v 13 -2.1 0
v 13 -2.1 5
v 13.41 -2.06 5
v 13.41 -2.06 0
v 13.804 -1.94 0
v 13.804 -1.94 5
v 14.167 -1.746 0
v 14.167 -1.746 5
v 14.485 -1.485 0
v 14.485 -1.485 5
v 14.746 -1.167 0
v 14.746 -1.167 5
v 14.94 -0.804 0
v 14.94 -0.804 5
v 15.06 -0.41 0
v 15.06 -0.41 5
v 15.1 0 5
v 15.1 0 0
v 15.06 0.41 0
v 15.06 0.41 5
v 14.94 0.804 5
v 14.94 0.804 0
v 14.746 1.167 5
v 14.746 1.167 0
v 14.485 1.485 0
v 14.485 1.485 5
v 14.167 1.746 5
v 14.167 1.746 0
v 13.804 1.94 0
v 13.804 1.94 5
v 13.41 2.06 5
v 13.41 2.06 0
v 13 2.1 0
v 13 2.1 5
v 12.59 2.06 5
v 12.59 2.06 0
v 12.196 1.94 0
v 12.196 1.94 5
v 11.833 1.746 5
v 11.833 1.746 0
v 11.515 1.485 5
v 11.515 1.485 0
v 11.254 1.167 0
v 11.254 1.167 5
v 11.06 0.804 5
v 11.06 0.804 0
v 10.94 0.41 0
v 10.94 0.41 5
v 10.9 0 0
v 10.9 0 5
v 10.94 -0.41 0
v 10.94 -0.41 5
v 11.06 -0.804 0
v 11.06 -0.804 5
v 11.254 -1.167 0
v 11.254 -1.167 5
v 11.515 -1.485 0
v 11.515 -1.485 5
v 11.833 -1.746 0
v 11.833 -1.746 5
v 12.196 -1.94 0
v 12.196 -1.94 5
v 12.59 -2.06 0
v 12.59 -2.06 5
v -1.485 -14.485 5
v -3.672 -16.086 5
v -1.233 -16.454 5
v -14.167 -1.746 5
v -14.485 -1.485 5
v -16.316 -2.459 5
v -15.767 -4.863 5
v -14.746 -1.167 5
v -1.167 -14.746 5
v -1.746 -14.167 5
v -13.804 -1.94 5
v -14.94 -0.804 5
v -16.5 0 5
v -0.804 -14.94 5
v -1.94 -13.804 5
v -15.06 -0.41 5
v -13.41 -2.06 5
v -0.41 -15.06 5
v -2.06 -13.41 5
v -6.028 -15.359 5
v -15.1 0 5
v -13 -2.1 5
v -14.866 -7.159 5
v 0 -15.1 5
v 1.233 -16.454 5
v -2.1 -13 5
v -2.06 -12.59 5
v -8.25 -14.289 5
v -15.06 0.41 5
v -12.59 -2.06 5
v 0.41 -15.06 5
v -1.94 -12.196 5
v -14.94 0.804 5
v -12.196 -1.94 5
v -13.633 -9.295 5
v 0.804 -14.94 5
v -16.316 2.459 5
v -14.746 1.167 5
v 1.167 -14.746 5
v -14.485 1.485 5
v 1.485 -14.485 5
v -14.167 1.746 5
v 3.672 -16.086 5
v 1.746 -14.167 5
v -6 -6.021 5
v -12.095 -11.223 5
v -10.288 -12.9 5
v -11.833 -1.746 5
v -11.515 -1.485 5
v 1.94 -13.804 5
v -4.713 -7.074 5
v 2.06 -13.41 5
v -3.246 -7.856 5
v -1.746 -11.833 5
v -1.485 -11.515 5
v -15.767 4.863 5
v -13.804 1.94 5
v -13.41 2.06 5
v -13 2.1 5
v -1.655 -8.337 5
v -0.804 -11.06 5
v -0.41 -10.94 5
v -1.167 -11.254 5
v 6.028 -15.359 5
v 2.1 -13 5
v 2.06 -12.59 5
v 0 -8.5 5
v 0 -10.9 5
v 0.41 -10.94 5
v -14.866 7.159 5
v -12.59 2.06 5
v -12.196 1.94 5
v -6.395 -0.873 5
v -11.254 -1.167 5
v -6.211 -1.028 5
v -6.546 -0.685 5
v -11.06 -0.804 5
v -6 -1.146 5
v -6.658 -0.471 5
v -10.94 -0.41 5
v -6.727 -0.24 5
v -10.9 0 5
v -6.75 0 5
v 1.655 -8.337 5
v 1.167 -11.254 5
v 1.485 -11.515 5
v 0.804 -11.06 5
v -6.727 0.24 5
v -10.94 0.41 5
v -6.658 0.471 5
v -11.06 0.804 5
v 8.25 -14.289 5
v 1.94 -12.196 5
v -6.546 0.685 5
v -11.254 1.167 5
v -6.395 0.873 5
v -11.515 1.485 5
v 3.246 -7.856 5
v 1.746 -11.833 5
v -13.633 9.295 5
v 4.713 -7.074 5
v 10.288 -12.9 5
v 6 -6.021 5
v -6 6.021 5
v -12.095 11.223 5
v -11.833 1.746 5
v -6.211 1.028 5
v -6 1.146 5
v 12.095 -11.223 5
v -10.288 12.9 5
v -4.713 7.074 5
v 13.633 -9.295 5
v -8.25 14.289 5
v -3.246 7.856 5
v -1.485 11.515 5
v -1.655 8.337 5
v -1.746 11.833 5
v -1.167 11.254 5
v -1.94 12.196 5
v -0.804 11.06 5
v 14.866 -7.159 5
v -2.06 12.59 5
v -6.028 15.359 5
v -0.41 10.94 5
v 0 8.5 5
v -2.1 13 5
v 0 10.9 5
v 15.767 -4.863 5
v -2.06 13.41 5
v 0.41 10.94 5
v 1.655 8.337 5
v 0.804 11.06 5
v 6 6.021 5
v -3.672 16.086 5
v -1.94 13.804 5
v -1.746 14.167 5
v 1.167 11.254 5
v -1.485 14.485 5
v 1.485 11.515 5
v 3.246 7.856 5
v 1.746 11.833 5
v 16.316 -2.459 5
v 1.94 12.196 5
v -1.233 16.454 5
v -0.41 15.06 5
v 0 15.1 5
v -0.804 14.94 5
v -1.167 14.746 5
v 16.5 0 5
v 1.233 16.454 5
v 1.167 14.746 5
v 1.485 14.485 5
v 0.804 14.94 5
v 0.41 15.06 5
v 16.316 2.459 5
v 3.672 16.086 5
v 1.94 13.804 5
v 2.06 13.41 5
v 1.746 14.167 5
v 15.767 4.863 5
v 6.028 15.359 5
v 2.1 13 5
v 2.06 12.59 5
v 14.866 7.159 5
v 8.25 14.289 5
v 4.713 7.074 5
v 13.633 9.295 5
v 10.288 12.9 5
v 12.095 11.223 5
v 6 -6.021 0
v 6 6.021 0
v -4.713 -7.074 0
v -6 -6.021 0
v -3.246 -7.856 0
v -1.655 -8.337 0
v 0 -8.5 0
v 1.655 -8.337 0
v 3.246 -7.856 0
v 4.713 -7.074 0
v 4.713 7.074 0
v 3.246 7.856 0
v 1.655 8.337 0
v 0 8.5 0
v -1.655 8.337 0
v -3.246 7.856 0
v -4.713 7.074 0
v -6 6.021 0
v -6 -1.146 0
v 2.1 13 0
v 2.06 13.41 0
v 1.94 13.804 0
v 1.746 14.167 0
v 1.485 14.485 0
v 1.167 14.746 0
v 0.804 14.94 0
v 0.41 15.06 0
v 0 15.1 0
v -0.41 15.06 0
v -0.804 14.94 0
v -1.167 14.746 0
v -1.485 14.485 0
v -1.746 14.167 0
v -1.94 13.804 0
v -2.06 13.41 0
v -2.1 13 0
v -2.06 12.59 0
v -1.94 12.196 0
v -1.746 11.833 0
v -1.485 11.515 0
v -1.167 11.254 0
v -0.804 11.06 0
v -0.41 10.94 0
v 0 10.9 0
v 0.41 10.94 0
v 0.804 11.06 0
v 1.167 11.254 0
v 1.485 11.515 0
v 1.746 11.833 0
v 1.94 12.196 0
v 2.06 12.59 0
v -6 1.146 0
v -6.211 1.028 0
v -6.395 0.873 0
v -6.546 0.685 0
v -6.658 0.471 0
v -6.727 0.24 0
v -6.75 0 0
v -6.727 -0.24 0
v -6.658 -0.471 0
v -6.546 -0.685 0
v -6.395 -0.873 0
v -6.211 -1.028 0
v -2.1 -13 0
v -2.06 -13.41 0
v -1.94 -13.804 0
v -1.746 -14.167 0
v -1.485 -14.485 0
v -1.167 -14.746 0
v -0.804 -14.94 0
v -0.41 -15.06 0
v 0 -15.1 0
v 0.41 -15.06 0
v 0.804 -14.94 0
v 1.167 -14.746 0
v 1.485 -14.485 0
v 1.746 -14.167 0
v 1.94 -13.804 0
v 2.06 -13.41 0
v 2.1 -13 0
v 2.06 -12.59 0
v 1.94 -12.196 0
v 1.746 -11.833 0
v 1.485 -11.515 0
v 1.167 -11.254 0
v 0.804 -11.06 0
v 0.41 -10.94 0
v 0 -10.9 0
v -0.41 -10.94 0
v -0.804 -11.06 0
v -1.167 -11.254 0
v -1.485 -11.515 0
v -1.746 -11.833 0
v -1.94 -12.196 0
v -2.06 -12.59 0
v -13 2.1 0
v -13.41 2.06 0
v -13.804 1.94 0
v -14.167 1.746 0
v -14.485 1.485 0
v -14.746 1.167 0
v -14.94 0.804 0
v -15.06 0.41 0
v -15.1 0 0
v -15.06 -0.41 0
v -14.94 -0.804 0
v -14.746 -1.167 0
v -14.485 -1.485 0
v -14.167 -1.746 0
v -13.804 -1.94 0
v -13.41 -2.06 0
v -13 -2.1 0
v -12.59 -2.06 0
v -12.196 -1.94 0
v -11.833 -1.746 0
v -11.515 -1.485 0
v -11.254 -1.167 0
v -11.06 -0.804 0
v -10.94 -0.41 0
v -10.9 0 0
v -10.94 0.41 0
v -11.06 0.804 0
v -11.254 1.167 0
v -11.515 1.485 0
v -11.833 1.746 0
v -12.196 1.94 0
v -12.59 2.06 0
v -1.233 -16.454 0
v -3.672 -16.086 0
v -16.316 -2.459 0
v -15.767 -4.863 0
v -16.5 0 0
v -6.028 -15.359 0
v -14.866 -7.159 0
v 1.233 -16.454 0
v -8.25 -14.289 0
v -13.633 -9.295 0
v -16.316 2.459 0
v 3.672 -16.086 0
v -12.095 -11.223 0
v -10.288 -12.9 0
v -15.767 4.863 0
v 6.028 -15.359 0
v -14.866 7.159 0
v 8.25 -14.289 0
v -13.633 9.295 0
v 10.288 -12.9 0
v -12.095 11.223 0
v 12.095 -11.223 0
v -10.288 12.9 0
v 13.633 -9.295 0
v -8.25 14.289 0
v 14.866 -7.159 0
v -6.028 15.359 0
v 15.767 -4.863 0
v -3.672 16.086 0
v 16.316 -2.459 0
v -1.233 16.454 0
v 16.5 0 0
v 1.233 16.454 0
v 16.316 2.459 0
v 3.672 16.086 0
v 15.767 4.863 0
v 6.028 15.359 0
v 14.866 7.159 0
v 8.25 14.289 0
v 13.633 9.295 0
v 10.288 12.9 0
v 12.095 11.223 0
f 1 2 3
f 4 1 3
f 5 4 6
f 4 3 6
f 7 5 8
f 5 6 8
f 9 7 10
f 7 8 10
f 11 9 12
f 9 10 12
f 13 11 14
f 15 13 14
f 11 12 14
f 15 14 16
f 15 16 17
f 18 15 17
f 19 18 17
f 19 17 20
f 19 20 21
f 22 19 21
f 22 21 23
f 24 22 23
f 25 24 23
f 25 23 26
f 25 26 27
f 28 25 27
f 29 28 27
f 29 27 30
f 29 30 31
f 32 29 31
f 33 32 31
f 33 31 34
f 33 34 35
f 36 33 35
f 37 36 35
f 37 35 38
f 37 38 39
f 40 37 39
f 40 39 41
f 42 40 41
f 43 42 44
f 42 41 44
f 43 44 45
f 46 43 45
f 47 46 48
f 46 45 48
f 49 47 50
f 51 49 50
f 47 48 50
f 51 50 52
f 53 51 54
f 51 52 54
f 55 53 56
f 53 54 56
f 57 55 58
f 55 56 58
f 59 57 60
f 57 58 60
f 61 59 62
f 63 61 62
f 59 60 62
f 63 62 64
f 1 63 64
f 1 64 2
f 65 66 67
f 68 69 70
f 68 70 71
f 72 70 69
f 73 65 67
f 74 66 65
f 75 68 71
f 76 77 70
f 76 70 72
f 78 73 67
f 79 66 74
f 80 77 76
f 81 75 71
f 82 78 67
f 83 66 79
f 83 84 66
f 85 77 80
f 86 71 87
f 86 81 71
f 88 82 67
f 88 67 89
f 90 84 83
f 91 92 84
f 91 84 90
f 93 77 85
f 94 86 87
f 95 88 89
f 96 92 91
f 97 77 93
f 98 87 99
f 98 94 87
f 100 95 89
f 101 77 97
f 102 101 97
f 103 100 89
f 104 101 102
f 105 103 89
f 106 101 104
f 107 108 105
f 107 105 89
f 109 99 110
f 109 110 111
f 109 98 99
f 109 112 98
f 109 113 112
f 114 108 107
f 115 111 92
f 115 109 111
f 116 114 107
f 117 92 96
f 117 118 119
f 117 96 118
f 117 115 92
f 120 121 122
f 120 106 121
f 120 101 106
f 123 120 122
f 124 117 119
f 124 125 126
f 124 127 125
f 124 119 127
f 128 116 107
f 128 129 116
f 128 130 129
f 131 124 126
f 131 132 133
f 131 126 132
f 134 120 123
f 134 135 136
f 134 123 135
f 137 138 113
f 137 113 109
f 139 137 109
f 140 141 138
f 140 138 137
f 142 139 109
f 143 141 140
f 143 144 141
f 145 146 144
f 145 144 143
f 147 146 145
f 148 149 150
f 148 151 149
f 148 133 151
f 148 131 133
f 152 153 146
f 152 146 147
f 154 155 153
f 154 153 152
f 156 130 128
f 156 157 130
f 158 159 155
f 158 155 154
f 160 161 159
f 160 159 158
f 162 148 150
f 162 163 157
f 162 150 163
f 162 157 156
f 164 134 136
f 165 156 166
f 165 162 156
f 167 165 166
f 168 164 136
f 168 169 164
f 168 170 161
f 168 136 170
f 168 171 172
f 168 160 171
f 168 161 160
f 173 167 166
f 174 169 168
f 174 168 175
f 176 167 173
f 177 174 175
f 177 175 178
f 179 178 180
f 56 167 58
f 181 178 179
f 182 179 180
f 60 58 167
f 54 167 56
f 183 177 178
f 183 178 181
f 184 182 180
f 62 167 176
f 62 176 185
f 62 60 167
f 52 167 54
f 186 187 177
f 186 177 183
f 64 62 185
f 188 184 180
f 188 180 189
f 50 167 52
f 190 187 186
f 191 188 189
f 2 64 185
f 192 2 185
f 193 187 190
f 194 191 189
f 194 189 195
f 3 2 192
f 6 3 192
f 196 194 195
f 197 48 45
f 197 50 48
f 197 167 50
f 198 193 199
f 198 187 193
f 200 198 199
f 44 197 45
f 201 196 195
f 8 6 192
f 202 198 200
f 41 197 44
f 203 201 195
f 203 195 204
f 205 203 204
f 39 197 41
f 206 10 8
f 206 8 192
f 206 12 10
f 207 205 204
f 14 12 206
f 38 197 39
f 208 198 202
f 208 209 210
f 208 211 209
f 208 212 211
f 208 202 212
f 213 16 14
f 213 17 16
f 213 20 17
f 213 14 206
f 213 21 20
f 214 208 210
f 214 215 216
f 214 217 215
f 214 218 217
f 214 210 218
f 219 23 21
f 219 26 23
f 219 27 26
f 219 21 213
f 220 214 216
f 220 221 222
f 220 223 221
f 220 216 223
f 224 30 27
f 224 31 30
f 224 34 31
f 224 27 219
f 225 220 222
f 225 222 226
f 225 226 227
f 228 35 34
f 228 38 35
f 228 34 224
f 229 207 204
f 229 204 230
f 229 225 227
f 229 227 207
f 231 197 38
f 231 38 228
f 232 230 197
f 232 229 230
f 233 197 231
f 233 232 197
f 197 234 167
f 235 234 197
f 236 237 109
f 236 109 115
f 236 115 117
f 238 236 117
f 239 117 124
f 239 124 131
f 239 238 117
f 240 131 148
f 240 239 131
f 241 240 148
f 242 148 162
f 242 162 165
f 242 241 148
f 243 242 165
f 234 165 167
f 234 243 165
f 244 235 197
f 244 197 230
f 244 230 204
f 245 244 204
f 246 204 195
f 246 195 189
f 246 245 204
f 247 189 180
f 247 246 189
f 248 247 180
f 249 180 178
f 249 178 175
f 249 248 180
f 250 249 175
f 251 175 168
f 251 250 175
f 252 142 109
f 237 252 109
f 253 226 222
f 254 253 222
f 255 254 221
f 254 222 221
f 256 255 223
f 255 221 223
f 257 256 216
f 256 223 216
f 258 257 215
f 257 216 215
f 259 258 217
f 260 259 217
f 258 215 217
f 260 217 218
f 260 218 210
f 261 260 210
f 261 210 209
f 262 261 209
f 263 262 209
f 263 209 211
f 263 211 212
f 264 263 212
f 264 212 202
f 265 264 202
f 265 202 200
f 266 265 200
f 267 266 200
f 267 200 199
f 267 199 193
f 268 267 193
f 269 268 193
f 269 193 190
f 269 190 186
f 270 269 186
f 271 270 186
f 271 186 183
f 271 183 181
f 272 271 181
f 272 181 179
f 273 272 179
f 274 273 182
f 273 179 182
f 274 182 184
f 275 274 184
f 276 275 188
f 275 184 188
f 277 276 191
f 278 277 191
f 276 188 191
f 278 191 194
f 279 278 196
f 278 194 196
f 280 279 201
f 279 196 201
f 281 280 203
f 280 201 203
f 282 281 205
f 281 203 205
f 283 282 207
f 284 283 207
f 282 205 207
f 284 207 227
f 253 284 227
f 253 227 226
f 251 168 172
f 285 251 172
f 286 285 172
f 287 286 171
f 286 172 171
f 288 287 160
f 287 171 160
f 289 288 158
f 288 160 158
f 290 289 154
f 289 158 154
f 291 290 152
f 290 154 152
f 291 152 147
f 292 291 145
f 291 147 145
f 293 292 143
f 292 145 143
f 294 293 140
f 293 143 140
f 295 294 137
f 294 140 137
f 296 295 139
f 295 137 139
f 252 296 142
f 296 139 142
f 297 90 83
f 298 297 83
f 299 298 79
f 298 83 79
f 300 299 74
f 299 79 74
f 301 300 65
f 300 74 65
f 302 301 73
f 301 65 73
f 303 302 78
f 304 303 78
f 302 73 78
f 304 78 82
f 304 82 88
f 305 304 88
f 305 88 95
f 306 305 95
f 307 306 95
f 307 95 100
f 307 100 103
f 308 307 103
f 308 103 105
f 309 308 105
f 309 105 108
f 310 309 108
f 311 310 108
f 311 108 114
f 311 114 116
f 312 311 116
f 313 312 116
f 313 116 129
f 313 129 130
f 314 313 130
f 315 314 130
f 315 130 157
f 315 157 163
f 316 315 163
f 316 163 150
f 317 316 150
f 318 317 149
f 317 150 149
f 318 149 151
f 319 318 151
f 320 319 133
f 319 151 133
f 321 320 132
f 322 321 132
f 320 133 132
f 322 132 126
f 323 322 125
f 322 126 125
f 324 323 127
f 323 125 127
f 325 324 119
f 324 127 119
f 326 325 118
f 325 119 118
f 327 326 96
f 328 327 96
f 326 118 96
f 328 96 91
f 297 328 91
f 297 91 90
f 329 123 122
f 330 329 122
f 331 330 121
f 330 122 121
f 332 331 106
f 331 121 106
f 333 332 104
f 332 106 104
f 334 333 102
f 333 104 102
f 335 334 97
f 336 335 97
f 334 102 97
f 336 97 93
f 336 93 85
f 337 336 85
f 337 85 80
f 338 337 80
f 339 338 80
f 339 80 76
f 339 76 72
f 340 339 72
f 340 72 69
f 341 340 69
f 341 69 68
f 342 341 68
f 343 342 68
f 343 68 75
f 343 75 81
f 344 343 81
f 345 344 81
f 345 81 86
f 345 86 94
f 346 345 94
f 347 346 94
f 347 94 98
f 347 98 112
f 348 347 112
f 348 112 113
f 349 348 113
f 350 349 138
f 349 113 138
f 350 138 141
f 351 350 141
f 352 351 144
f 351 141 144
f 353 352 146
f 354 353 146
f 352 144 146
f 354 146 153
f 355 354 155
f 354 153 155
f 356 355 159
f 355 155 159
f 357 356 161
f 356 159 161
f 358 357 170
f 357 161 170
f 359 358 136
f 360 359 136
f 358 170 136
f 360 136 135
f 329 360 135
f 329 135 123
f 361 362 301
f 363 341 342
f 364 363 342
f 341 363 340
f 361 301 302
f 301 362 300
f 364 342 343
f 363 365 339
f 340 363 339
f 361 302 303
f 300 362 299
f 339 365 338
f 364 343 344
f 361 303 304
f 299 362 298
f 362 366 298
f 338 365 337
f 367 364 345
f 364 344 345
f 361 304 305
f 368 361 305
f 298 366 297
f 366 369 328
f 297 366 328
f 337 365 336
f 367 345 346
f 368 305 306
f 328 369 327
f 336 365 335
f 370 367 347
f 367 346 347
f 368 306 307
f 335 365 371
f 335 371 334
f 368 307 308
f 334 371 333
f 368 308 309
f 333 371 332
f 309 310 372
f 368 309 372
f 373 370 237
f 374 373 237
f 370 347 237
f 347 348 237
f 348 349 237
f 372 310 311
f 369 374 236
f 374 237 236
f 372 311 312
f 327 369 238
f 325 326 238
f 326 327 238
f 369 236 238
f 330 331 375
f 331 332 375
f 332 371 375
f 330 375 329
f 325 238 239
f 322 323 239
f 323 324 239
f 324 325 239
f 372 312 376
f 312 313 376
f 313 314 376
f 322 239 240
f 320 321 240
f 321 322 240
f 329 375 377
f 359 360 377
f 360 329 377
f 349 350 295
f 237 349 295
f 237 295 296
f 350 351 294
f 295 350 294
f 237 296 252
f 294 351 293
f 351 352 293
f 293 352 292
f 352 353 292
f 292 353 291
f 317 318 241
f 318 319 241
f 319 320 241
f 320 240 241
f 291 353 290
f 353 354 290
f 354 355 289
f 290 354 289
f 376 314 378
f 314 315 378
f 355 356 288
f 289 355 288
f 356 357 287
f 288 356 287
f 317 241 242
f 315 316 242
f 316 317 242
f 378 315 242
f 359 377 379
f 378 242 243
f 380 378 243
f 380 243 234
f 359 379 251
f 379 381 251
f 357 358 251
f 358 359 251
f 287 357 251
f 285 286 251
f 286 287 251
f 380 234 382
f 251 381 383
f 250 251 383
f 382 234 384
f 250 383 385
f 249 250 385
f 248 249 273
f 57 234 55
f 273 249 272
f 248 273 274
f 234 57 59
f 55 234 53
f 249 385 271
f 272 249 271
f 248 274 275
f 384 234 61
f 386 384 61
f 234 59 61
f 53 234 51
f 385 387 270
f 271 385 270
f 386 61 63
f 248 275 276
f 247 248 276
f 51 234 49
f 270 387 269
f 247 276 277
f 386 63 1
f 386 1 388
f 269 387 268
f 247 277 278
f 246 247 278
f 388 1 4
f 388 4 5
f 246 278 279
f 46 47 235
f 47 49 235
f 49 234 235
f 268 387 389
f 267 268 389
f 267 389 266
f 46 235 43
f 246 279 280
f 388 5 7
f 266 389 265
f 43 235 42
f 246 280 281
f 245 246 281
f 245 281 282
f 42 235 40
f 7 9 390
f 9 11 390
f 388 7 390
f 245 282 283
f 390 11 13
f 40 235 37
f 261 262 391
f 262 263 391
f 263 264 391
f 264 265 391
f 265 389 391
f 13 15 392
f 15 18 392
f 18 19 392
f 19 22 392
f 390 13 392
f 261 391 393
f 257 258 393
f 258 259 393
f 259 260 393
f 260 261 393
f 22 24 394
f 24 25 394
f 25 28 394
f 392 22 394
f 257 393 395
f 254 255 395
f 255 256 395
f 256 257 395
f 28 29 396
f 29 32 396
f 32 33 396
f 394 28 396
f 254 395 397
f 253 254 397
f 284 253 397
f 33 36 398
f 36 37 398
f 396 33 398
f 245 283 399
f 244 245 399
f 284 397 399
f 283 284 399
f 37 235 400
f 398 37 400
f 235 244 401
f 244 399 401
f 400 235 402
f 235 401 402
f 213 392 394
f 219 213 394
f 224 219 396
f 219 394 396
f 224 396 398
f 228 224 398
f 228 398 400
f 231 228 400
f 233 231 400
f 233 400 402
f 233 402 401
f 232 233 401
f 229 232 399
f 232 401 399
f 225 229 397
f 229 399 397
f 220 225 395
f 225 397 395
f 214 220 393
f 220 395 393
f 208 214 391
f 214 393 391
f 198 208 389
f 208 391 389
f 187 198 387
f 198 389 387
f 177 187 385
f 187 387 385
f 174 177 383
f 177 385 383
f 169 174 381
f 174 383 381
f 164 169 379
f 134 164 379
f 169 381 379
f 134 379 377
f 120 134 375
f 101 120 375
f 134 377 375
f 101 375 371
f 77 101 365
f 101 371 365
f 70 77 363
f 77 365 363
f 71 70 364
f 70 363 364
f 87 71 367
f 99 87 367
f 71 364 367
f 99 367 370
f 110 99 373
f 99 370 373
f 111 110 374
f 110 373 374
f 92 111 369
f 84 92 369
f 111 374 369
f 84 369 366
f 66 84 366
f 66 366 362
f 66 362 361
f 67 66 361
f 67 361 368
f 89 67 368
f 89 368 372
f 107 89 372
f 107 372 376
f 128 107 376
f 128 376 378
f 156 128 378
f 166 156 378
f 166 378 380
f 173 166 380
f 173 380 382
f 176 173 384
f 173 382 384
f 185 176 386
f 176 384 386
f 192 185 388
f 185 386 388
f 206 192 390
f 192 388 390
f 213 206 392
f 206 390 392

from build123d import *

# Parameters (mm, degrees)
ESQUISSE1_R                  = 16.5
EXTRUSION1_DEPTH             = 5
ESQUISSE2_R                  = 2.1
ENL_V_MAT_EXTRU_1_DEPTH      = 24.864199128
R_P_TITION_CIRCULAIRE1_COUNT = 4
ESQUISSE3_R                  = 1.25
ENL_V_MAT_EXTRU_2_DEPTH      = 24.864199128


with BuildPart() as part:
    # Esquisse1 → Extrusion1 (new body)
    with BuildSketch(Plane.XY):
        Circle(ESQUISSE1_R)
        with BuildLine():
            Line((-6, 6.020797289), (-6, -6.020797289))
            ThreePointArc((-6, -6.020797289), (0, -8.5), (6, -6.020797289))
            Line((6, -6.020797289), (6, 6.020797289))
            ThreePointArc((6, 6.020797289), (0, 8.5), (-6, 6.020797289))
        make_face(mode=Mode.SUBTRACT)
    extrude(amount=EXTRUSION1_DEPTH)

    # Esquisse2 → Enlèv. mat.-Extru.1 (cut, through all)
    with BuildSketch(Plane.XY.offset(5)):
        with Locations((0, 13)):
            Circle(ESQUISSE2_R)
    enl_v_mat_extru_1 = extrude(amount=-ENL_V_MAT_EXTRU_1_DEPTH, mode=Mode.SUBTRACT)

    # Répétition circulaire1: Enlèv. mat.-Extru.1 ×4 about axis
    r_p_tition_circulaire1_axis = Axis((0, 0, 5), (0, 0, -1))
    for i in range(1, R_P_TITION_CIRCULAIRE1_COUNT):
        add(enl_v_mat_extru_1.rotate(r_p_tition_circulaire1_axis, i * 360 / R_P_TITION_CIRCULAIRE1_COUNT), mode=Mode.SUBTRACT)

    # Esquisse3 → Enlèv. mat.-Extru.2 (cut, through all)
    with BuildSketch(Plane.XY.offset(5)):
        with Locations((-5.5, 0)):
            Circle(ESQUISSE3_R)
    extrude(amount=-ENL_V_MAT_EXTRU_2_DEPTH, mode=Mode.SUBTRACT)


solid = part.part
